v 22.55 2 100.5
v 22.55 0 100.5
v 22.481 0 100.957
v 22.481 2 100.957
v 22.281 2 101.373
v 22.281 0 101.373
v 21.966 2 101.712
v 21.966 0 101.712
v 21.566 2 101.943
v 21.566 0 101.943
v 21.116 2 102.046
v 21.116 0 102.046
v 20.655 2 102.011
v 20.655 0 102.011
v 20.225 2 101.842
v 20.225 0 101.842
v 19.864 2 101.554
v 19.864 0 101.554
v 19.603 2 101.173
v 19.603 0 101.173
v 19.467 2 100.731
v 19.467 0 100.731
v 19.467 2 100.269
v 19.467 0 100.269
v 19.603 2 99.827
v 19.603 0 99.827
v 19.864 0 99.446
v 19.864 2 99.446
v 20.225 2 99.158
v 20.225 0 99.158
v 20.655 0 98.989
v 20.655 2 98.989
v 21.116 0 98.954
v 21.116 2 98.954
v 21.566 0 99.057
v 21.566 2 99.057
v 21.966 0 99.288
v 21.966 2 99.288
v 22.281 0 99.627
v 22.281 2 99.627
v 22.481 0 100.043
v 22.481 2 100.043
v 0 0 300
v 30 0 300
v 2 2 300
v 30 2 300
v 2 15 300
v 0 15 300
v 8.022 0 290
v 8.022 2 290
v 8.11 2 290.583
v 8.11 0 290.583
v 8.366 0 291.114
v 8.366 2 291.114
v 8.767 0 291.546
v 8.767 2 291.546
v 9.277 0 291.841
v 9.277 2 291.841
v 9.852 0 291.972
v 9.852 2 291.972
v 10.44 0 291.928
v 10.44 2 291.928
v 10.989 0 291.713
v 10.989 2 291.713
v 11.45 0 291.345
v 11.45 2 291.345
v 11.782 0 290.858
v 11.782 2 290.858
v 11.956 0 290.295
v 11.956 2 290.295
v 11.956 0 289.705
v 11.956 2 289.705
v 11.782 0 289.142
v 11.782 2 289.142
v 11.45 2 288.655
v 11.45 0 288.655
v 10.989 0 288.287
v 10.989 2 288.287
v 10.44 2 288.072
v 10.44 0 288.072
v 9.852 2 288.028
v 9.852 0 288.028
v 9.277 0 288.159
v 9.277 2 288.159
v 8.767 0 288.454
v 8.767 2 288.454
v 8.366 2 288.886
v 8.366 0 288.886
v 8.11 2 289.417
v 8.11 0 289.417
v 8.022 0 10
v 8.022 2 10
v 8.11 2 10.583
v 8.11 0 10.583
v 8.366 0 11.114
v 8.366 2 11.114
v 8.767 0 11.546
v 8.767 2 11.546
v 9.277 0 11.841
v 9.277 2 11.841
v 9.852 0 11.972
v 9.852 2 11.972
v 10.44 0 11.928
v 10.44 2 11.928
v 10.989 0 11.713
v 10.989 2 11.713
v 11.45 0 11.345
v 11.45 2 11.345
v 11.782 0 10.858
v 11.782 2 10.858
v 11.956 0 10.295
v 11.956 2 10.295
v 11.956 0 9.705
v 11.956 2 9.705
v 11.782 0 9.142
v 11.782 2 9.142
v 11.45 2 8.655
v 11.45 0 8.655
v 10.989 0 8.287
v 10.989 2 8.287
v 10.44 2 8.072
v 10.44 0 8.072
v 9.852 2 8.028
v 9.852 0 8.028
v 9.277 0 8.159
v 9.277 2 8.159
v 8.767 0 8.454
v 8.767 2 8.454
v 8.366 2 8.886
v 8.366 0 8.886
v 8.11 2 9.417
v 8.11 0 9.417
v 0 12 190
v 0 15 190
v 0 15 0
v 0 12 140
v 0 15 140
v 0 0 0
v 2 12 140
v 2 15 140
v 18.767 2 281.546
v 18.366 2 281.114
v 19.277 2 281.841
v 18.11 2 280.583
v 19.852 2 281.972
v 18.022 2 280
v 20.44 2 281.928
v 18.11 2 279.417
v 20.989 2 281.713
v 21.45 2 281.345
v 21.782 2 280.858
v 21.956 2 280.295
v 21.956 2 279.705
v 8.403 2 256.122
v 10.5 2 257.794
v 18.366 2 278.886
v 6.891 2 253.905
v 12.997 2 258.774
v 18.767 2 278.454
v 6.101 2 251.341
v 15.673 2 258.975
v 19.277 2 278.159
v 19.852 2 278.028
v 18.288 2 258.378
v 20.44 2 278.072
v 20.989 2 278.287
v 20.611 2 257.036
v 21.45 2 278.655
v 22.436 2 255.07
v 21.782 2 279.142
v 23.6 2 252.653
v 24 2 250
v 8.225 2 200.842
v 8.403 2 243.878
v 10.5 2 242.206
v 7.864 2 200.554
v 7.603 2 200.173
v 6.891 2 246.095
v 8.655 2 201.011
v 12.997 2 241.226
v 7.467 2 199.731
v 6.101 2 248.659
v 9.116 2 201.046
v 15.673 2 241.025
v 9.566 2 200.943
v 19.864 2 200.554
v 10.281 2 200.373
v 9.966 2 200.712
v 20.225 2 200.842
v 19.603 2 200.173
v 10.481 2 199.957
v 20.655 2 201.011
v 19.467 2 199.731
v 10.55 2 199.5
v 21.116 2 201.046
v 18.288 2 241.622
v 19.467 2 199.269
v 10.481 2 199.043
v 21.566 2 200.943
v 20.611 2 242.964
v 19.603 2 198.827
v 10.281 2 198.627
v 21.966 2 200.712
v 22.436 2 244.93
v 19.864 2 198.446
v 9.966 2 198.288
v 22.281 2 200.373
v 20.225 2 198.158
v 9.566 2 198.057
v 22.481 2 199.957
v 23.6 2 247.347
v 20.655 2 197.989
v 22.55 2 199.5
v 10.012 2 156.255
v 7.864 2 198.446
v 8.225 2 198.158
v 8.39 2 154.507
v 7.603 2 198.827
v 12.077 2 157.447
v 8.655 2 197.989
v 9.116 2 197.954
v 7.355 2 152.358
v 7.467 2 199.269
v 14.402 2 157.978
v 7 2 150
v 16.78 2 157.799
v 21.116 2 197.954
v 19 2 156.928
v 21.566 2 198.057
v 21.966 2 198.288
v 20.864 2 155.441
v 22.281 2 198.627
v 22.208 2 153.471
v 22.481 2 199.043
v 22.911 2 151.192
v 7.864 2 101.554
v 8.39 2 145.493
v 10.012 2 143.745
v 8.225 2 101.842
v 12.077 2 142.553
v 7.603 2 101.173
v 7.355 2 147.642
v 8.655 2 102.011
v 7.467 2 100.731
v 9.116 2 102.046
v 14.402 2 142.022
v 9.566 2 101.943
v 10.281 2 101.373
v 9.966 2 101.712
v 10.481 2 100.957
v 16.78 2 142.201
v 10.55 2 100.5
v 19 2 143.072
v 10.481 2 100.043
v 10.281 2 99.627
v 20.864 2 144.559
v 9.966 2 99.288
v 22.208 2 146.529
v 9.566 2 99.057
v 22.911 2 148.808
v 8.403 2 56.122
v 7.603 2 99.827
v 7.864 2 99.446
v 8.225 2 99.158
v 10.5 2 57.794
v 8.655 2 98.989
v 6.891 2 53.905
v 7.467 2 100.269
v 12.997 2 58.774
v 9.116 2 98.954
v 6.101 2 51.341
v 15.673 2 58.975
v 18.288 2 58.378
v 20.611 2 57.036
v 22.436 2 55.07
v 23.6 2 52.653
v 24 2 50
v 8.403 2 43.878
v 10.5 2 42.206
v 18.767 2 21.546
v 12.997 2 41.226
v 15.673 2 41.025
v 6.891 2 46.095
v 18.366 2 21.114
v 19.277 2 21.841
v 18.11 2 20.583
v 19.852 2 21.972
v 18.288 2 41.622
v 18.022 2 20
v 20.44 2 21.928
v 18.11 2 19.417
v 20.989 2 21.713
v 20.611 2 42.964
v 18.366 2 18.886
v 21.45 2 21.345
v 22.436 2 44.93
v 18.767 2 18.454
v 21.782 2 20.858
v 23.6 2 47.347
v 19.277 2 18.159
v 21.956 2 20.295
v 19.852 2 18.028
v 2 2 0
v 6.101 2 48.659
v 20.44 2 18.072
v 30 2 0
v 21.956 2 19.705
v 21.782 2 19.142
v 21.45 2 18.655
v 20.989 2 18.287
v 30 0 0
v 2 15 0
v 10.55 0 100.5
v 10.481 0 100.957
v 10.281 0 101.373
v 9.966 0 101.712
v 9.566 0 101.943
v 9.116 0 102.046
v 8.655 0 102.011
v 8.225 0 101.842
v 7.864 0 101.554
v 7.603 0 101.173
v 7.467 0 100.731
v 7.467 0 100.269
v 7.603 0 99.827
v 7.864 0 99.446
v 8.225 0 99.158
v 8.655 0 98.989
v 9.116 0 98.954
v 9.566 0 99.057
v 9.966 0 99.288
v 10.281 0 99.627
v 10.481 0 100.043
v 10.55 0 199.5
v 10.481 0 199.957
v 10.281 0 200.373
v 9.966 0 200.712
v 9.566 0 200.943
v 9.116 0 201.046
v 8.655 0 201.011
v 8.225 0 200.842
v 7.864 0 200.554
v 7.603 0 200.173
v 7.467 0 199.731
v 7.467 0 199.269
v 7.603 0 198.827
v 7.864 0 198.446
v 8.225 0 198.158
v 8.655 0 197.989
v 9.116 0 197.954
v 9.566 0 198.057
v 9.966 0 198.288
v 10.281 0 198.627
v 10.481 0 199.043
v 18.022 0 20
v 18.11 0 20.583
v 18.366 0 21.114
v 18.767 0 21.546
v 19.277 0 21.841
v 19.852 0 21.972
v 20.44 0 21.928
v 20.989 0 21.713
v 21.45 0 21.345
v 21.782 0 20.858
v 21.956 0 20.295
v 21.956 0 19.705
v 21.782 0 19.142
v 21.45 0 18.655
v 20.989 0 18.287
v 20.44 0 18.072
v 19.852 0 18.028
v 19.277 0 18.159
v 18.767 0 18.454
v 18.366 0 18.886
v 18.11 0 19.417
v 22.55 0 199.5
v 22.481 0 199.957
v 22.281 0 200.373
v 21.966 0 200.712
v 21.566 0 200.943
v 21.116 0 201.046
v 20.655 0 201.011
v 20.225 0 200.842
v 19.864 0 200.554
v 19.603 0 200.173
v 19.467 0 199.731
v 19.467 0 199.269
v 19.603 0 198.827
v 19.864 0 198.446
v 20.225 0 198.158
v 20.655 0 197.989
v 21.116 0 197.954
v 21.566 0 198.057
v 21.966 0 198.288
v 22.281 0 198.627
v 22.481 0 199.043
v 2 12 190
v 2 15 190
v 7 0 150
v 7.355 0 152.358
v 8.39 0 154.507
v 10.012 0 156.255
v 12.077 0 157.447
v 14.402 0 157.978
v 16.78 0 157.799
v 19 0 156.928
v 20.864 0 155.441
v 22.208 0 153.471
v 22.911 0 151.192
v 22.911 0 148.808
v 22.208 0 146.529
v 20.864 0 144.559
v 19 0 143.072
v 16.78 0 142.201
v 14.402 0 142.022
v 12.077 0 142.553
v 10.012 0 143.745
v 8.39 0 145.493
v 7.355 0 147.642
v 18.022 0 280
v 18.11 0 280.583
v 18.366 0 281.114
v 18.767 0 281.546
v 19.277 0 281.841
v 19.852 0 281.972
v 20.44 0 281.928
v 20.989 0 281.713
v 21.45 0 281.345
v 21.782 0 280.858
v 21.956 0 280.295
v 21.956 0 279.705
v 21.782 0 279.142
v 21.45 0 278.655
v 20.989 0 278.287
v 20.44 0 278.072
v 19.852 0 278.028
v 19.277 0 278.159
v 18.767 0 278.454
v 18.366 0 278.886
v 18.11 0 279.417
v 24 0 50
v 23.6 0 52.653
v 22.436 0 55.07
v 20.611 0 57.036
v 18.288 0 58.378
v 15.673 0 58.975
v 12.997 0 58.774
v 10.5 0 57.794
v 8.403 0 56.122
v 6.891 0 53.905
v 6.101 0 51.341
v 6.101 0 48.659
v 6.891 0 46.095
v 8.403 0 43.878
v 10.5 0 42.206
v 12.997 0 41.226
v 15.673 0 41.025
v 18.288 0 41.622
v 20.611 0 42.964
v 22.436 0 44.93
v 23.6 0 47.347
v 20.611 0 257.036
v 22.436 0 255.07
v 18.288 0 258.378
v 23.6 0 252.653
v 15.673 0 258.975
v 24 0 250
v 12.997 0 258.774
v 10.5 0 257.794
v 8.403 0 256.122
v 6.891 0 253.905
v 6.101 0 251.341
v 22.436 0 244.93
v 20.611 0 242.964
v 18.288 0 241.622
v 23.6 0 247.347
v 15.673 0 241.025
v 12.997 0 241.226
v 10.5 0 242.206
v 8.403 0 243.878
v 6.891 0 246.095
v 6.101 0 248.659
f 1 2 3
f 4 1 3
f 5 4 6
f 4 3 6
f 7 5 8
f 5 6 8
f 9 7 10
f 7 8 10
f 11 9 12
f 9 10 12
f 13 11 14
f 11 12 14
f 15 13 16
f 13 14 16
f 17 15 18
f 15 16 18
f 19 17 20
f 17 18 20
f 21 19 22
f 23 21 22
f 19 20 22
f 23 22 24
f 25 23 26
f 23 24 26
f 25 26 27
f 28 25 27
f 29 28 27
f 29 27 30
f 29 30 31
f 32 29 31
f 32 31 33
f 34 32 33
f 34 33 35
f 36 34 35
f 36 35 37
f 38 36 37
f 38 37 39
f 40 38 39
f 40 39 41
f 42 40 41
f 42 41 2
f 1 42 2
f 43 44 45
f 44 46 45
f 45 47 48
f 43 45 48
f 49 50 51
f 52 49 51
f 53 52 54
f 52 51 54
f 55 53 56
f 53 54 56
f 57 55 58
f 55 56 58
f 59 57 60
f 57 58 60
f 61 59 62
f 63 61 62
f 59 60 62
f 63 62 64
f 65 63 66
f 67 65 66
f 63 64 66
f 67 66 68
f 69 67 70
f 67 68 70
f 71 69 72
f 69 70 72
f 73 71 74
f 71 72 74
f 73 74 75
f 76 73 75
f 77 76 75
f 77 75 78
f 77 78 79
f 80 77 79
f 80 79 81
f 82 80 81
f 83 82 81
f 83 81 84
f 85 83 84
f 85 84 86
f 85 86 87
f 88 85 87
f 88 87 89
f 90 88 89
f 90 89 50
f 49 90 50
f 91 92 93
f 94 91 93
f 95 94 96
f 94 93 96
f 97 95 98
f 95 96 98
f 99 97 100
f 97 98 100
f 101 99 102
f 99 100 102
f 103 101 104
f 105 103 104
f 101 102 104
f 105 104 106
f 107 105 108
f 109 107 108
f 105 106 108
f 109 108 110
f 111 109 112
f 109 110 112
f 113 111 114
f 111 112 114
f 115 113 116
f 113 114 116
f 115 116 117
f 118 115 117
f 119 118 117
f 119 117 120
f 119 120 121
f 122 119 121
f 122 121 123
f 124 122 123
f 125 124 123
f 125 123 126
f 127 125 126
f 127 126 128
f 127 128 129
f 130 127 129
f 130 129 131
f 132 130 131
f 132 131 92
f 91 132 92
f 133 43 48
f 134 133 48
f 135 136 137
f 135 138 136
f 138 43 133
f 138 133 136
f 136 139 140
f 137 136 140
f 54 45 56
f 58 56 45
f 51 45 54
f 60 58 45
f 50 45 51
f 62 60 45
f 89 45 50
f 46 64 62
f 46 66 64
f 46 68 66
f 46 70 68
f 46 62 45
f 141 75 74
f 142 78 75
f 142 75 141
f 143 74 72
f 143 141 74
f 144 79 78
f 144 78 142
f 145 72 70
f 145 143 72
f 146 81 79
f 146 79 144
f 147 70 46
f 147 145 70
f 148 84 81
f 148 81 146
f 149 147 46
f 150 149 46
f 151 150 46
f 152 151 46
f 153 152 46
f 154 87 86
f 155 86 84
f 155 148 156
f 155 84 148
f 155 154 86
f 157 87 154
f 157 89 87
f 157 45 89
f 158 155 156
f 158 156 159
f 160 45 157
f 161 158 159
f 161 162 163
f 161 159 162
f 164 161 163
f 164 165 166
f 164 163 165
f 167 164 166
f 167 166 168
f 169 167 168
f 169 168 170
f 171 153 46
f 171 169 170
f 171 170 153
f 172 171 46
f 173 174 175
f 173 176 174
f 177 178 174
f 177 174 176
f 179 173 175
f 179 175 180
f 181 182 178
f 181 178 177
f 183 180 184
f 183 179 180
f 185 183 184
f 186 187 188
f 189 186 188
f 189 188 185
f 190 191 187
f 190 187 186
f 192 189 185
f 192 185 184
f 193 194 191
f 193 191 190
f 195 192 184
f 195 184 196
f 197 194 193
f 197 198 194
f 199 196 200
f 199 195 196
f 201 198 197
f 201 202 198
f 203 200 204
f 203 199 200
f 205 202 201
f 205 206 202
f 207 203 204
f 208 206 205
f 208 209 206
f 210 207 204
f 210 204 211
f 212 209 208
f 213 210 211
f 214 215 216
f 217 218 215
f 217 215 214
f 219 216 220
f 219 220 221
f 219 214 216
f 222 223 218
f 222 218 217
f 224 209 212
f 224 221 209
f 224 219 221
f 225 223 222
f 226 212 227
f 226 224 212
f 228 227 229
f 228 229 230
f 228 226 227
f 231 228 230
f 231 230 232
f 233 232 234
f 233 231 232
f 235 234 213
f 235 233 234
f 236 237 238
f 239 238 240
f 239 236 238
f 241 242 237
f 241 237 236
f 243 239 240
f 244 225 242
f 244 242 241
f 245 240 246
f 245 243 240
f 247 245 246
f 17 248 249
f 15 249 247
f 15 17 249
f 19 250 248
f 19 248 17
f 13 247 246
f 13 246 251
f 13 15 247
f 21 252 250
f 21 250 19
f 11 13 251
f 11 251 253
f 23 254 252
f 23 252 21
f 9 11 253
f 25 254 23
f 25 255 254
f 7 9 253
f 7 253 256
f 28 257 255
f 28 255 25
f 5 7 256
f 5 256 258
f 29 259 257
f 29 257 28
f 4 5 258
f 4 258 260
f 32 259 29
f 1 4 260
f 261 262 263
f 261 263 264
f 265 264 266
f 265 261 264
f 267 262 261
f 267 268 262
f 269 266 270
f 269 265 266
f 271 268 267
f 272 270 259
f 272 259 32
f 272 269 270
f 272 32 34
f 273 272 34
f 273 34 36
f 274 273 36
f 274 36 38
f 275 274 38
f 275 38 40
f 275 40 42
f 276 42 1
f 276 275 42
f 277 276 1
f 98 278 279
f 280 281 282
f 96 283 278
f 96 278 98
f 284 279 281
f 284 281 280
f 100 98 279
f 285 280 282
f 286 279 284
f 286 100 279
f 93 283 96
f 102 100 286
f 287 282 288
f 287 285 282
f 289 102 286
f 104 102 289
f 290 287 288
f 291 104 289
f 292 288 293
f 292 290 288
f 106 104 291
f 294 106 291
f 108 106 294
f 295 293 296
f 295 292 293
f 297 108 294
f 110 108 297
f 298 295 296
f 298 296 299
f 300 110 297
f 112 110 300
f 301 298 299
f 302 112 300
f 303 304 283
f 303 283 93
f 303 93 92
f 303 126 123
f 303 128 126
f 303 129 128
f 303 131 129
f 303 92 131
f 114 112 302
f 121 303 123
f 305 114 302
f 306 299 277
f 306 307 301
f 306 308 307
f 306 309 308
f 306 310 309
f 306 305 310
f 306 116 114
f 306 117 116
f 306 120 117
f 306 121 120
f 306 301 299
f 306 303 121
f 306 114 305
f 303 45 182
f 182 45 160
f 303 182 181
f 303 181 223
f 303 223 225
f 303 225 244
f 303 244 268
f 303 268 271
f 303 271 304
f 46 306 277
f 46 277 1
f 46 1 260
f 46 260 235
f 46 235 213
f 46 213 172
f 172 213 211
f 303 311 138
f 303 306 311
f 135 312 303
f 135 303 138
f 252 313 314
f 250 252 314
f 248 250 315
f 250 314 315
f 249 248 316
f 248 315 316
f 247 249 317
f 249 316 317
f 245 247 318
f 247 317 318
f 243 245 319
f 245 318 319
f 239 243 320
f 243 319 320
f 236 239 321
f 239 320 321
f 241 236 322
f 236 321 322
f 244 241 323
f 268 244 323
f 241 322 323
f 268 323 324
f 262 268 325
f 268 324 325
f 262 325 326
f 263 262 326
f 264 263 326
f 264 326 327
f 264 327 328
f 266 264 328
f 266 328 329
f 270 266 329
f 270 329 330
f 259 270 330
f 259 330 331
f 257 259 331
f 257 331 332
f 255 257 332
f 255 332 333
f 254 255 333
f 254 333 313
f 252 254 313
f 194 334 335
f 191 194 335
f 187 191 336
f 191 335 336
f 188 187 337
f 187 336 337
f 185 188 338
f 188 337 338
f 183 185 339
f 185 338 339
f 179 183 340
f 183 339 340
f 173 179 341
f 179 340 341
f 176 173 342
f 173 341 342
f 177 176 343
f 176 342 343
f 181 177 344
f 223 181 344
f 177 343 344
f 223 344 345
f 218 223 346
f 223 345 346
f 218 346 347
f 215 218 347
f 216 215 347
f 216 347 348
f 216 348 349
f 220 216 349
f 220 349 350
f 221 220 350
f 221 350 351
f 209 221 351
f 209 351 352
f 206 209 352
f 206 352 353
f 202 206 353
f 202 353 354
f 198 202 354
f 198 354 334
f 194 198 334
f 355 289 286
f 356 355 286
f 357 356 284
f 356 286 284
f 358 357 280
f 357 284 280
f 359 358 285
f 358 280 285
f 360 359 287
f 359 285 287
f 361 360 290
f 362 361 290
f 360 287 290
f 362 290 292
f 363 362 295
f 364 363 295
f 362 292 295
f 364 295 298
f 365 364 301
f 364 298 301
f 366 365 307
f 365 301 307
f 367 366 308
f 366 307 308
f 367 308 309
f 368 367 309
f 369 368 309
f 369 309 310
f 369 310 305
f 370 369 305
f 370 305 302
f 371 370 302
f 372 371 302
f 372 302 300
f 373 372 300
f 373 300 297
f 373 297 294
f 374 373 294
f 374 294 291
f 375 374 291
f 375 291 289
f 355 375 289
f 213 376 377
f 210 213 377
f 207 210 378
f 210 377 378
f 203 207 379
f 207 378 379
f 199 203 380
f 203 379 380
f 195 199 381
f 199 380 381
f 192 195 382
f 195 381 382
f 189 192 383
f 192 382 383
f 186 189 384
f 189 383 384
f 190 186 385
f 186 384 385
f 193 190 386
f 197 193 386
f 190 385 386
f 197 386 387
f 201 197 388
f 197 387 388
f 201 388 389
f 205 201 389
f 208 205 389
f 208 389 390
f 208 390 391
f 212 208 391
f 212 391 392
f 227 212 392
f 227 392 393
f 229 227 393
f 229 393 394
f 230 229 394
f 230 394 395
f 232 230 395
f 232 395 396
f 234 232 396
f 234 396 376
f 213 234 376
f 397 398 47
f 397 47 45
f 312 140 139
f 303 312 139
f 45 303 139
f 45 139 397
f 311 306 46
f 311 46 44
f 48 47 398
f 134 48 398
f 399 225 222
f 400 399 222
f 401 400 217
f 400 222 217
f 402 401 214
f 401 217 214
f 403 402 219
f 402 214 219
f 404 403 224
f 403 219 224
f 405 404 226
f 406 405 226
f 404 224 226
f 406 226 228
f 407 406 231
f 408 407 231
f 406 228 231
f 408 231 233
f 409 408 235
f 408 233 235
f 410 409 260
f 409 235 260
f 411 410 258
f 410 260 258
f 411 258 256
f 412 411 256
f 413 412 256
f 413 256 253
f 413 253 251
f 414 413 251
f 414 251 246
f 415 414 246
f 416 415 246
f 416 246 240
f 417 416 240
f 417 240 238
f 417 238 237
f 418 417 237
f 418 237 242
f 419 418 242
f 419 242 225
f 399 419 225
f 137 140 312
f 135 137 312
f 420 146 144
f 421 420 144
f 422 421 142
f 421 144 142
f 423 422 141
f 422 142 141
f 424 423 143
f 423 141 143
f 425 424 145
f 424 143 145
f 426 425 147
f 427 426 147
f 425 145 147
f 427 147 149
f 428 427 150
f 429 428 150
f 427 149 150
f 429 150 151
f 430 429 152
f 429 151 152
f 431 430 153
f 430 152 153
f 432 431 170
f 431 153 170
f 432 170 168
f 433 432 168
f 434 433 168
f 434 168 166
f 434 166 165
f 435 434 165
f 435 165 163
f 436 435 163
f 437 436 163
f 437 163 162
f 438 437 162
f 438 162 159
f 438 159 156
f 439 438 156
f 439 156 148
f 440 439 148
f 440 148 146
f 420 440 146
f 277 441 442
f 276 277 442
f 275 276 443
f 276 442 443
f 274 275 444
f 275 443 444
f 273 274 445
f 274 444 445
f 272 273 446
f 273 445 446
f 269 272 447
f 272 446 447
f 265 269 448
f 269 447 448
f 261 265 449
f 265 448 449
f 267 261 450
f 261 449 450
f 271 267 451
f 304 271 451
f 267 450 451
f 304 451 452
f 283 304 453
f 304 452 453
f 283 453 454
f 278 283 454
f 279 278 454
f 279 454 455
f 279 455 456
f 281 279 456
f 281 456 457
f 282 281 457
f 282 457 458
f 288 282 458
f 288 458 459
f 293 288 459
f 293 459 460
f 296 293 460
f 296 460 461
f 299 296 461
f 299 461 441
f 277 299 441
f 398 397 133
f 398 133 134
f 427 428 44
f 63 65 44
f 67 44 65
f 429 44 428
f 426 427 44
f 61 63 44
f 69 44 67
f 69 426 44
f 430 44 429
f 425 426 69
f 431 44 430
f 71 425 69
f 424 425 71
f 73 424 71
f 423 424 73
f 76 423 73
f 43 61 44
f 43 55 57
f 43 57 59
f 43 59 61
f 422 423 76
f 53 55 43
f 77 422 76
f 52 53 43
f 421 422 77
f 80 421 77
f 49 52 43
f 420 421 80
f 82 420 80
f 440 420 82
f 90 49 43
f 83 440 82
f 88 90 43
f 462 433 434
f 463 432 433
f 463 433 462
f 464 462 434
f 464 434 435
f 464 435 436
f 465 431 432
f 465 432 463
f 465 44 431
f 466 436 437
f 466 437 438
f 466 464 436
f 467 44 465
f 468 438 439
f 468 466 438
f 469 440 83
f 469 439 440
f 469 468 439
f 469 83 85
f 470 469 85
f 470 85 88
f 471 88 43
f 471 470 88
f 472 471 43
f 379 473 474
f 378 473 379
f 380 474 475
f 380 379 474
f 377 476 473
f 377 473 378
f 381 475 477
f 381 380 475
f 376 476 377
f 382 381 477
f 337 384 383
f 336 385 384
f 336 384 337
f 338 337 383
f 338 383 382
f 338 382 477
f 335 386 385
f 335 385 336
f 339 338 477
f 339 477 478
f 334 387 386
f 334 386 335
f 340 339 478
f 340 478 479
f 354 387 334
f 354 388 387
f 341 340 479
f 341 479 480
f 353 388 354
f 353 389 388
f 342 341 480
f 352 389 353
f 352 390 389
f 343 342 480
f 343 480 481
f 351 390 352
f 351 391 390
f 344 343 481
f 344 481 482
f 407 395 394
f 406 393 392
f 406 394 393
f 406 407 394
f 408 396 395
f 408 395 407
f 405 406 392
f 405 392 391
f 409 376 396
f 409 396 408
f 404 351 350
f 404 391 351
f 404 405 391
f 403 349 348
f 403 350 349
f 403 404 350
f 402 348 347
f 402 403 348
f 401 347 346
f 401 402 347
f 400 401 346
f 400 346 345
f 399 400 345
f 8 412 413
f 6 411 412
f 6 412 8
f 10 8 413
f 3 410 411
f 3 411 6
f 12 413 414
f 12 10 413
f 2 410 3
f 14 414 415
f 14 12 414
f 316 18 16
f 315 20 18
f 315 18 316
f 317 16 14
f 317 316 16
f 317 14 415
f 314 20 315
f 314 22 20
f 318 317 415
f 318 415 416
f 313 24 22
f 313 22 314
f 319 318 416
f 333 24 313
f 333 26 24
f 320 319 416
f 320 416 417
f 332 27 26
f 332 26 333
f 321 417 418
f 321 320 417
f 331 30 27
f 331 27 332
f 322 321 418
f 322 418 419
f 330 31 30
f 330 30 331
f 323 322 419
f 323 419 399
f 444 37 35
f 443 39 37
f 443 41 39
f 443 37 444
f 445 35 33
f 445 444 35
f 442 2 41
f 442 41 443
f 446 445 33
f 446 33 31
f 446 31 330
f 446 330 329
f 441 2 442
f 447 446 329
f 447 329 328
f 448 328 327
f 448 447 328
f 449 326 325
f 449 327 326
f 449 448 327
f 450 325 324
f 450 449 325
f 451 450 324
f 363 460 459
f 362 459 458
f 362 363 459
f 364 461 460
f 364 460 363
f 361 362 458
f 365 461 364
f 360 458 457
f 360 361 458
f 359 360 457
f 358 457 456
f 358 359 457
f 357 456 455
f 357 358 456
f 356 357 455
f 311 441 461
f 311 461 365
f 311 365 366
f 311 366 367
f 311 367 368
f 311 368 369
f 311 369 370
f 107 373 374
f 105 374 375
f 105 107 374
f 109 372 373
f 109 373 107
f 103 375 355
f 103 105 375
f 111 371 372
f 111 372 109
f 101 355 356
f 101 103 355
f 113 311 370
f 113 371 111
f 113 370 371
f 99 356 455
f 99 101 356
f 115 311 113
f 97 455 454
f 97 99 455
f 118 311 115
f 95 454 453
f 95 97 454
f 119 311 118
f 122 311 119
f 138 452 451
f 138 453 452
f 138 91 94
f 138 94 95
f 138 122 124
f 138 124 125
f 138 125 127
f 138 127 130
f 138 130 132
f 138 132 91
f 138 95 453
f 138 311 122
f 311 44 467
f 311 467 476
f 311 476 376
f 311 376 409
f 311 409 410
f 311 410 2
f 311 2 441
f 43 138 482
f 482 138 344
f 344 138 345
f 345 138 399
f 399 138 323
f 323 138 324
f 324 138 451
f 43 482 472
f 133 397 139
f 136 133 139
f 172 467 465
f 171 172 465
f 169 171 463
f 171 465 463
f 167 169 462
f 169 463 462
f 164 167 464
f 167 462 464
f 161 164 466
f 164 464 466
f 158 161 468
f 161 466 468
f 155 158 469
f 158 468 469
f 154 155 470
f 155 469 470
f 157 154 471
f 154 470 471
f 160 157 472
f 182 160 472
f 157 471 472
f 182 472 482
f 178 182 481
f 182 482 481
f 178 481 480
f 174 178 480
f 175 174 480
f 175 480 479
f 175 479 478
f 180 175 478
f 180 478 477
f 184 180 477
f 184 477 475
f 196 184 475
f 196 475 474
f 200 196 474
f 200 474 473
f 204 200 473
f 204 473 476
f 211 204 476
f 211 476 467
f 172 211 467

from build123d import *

# Parameters (mm, degrees)
BOSS_EXTRUDE1_DEPTH = 300
SKETCH2_R           = 8
SKETCH2_R_2         = 1.977693409
CUT_EXTRUDE1_DEPTH  = 10
SKETCH3_W           = 300
SKETCH3_H           = 10
CUT_EXTRUDE2_DEPTH  = 10
SKETCH4_W           = 50
SKETCH4_H           = 3
CUT_EXTRUDE3_DEPTH  = 10
SKETCH5_R           = 1.55
CUT_EXTRUDE4_DEPTH  = 273
SKETCH6_R           = 9
CUT_EXTRUDE5_DEPTH  = 5


with BuildPart() as part:
    # Sketch1 → Boss-Extrude1 (new body)
    with BuildSketch(Plane.XY):
        Polygon((0, 0), (0, 25), (2, 25), (2, 2), (30, 2), (30, 0), align=None)
    extrude(amount=BOSS_EXTRUDE1_DEPTH)

    # Sketch2 → Cut-Extrude1 (cut)
    with BuildSketch(Plane(origin=(0, 2, 0), x_dir=(1, 0, 0), z_dir=(0, 1, 0))):
        with Locations(Location((15, -150, 0), (0, 0, 180))):
            Circle(SKETCH2_R)
        with Locations(Location((10, -10, 0), (0, 0, 180))):
            Circle(SKETCH2_R_2)
        with Locations(Location((20, -20, 0), (0, 0, 180))):
            Circle(SKETCH2_R_2)
        with Locations(Location((10, -290, 0), (0, 0, 180))):
            Circle(SKETCH2_R_2)
        with Locations(Location((20, -280, 0), (0, 0, 180))):
            Circle(SKETCH2_R_2)
    extrude(amount=-CUT_EXTRUDE1_DEPTH, mode=Mode.SUBTRACT)

    # Sketch3 → Cut-Extrude2 (cut)
    with BuildSketch(Plane(origin=(2, 0, 0), x_dir=(0, 0, -1), z_dir=(1, 0, 0))):
        with Locations((-150, 20)):
            Rectangle(SKETCH3_W, SKETCH3_H)
    extrude(amount=-CUT_EXTRUDE2_DEPTH, mode=Mode.SUBTRACT)

    # Sketch4 → Cut-Extrude3 (cut)
    with BuildSketch(Plane(origin=(2, 0, 0), x_dir=(0, 0, -1), z_dir=(1, 0, 0))):
        with Locations((-165, 13.5)):
            Rectangle(SKETCH4_W, SKETCH4_H)
    extrude(amount=-CUT_EXTRUDE3_DEPTH, mode=Mode.SUBTRACT)

    # Sketch5 → Cut-Extrude4 (cut)
    with BuildSketch(Plane.XZ):
        with Locations((21, 199.5)):
            Circle(SKETCH5_R)
        with Locations((9, 199.5)):
            Circle(SKETCH5_R)
        with Locations((21, 100.5)):
            Circle(SKETCH5_R)
        with Locations((9, 100.5)):
            Circle(SKETCH5_R)
    extrude(amount=-CUT_EXTRUDE4_DEPTH, mode=Mode.SUBTRACT)

    # Sketch6 → Cut-Extrude5 (cut)
    with BuildSketch(Plane.XZ):
        with Locations((15, 250)):
            Circle(SKETCH6_R)
        with Locations((15, 50)):
            Circle(SKETCH6_R)
        with Locations((-238, 50)):
            Circle(SKETCH6_R)
        with Locations((-238, 250)):
            Circle(SKETCH6_R)
    extrude(amount=-CUT_EXTRUDE5_DEPTH, mode=Mode.SUBTRACT)


solid = part.part
